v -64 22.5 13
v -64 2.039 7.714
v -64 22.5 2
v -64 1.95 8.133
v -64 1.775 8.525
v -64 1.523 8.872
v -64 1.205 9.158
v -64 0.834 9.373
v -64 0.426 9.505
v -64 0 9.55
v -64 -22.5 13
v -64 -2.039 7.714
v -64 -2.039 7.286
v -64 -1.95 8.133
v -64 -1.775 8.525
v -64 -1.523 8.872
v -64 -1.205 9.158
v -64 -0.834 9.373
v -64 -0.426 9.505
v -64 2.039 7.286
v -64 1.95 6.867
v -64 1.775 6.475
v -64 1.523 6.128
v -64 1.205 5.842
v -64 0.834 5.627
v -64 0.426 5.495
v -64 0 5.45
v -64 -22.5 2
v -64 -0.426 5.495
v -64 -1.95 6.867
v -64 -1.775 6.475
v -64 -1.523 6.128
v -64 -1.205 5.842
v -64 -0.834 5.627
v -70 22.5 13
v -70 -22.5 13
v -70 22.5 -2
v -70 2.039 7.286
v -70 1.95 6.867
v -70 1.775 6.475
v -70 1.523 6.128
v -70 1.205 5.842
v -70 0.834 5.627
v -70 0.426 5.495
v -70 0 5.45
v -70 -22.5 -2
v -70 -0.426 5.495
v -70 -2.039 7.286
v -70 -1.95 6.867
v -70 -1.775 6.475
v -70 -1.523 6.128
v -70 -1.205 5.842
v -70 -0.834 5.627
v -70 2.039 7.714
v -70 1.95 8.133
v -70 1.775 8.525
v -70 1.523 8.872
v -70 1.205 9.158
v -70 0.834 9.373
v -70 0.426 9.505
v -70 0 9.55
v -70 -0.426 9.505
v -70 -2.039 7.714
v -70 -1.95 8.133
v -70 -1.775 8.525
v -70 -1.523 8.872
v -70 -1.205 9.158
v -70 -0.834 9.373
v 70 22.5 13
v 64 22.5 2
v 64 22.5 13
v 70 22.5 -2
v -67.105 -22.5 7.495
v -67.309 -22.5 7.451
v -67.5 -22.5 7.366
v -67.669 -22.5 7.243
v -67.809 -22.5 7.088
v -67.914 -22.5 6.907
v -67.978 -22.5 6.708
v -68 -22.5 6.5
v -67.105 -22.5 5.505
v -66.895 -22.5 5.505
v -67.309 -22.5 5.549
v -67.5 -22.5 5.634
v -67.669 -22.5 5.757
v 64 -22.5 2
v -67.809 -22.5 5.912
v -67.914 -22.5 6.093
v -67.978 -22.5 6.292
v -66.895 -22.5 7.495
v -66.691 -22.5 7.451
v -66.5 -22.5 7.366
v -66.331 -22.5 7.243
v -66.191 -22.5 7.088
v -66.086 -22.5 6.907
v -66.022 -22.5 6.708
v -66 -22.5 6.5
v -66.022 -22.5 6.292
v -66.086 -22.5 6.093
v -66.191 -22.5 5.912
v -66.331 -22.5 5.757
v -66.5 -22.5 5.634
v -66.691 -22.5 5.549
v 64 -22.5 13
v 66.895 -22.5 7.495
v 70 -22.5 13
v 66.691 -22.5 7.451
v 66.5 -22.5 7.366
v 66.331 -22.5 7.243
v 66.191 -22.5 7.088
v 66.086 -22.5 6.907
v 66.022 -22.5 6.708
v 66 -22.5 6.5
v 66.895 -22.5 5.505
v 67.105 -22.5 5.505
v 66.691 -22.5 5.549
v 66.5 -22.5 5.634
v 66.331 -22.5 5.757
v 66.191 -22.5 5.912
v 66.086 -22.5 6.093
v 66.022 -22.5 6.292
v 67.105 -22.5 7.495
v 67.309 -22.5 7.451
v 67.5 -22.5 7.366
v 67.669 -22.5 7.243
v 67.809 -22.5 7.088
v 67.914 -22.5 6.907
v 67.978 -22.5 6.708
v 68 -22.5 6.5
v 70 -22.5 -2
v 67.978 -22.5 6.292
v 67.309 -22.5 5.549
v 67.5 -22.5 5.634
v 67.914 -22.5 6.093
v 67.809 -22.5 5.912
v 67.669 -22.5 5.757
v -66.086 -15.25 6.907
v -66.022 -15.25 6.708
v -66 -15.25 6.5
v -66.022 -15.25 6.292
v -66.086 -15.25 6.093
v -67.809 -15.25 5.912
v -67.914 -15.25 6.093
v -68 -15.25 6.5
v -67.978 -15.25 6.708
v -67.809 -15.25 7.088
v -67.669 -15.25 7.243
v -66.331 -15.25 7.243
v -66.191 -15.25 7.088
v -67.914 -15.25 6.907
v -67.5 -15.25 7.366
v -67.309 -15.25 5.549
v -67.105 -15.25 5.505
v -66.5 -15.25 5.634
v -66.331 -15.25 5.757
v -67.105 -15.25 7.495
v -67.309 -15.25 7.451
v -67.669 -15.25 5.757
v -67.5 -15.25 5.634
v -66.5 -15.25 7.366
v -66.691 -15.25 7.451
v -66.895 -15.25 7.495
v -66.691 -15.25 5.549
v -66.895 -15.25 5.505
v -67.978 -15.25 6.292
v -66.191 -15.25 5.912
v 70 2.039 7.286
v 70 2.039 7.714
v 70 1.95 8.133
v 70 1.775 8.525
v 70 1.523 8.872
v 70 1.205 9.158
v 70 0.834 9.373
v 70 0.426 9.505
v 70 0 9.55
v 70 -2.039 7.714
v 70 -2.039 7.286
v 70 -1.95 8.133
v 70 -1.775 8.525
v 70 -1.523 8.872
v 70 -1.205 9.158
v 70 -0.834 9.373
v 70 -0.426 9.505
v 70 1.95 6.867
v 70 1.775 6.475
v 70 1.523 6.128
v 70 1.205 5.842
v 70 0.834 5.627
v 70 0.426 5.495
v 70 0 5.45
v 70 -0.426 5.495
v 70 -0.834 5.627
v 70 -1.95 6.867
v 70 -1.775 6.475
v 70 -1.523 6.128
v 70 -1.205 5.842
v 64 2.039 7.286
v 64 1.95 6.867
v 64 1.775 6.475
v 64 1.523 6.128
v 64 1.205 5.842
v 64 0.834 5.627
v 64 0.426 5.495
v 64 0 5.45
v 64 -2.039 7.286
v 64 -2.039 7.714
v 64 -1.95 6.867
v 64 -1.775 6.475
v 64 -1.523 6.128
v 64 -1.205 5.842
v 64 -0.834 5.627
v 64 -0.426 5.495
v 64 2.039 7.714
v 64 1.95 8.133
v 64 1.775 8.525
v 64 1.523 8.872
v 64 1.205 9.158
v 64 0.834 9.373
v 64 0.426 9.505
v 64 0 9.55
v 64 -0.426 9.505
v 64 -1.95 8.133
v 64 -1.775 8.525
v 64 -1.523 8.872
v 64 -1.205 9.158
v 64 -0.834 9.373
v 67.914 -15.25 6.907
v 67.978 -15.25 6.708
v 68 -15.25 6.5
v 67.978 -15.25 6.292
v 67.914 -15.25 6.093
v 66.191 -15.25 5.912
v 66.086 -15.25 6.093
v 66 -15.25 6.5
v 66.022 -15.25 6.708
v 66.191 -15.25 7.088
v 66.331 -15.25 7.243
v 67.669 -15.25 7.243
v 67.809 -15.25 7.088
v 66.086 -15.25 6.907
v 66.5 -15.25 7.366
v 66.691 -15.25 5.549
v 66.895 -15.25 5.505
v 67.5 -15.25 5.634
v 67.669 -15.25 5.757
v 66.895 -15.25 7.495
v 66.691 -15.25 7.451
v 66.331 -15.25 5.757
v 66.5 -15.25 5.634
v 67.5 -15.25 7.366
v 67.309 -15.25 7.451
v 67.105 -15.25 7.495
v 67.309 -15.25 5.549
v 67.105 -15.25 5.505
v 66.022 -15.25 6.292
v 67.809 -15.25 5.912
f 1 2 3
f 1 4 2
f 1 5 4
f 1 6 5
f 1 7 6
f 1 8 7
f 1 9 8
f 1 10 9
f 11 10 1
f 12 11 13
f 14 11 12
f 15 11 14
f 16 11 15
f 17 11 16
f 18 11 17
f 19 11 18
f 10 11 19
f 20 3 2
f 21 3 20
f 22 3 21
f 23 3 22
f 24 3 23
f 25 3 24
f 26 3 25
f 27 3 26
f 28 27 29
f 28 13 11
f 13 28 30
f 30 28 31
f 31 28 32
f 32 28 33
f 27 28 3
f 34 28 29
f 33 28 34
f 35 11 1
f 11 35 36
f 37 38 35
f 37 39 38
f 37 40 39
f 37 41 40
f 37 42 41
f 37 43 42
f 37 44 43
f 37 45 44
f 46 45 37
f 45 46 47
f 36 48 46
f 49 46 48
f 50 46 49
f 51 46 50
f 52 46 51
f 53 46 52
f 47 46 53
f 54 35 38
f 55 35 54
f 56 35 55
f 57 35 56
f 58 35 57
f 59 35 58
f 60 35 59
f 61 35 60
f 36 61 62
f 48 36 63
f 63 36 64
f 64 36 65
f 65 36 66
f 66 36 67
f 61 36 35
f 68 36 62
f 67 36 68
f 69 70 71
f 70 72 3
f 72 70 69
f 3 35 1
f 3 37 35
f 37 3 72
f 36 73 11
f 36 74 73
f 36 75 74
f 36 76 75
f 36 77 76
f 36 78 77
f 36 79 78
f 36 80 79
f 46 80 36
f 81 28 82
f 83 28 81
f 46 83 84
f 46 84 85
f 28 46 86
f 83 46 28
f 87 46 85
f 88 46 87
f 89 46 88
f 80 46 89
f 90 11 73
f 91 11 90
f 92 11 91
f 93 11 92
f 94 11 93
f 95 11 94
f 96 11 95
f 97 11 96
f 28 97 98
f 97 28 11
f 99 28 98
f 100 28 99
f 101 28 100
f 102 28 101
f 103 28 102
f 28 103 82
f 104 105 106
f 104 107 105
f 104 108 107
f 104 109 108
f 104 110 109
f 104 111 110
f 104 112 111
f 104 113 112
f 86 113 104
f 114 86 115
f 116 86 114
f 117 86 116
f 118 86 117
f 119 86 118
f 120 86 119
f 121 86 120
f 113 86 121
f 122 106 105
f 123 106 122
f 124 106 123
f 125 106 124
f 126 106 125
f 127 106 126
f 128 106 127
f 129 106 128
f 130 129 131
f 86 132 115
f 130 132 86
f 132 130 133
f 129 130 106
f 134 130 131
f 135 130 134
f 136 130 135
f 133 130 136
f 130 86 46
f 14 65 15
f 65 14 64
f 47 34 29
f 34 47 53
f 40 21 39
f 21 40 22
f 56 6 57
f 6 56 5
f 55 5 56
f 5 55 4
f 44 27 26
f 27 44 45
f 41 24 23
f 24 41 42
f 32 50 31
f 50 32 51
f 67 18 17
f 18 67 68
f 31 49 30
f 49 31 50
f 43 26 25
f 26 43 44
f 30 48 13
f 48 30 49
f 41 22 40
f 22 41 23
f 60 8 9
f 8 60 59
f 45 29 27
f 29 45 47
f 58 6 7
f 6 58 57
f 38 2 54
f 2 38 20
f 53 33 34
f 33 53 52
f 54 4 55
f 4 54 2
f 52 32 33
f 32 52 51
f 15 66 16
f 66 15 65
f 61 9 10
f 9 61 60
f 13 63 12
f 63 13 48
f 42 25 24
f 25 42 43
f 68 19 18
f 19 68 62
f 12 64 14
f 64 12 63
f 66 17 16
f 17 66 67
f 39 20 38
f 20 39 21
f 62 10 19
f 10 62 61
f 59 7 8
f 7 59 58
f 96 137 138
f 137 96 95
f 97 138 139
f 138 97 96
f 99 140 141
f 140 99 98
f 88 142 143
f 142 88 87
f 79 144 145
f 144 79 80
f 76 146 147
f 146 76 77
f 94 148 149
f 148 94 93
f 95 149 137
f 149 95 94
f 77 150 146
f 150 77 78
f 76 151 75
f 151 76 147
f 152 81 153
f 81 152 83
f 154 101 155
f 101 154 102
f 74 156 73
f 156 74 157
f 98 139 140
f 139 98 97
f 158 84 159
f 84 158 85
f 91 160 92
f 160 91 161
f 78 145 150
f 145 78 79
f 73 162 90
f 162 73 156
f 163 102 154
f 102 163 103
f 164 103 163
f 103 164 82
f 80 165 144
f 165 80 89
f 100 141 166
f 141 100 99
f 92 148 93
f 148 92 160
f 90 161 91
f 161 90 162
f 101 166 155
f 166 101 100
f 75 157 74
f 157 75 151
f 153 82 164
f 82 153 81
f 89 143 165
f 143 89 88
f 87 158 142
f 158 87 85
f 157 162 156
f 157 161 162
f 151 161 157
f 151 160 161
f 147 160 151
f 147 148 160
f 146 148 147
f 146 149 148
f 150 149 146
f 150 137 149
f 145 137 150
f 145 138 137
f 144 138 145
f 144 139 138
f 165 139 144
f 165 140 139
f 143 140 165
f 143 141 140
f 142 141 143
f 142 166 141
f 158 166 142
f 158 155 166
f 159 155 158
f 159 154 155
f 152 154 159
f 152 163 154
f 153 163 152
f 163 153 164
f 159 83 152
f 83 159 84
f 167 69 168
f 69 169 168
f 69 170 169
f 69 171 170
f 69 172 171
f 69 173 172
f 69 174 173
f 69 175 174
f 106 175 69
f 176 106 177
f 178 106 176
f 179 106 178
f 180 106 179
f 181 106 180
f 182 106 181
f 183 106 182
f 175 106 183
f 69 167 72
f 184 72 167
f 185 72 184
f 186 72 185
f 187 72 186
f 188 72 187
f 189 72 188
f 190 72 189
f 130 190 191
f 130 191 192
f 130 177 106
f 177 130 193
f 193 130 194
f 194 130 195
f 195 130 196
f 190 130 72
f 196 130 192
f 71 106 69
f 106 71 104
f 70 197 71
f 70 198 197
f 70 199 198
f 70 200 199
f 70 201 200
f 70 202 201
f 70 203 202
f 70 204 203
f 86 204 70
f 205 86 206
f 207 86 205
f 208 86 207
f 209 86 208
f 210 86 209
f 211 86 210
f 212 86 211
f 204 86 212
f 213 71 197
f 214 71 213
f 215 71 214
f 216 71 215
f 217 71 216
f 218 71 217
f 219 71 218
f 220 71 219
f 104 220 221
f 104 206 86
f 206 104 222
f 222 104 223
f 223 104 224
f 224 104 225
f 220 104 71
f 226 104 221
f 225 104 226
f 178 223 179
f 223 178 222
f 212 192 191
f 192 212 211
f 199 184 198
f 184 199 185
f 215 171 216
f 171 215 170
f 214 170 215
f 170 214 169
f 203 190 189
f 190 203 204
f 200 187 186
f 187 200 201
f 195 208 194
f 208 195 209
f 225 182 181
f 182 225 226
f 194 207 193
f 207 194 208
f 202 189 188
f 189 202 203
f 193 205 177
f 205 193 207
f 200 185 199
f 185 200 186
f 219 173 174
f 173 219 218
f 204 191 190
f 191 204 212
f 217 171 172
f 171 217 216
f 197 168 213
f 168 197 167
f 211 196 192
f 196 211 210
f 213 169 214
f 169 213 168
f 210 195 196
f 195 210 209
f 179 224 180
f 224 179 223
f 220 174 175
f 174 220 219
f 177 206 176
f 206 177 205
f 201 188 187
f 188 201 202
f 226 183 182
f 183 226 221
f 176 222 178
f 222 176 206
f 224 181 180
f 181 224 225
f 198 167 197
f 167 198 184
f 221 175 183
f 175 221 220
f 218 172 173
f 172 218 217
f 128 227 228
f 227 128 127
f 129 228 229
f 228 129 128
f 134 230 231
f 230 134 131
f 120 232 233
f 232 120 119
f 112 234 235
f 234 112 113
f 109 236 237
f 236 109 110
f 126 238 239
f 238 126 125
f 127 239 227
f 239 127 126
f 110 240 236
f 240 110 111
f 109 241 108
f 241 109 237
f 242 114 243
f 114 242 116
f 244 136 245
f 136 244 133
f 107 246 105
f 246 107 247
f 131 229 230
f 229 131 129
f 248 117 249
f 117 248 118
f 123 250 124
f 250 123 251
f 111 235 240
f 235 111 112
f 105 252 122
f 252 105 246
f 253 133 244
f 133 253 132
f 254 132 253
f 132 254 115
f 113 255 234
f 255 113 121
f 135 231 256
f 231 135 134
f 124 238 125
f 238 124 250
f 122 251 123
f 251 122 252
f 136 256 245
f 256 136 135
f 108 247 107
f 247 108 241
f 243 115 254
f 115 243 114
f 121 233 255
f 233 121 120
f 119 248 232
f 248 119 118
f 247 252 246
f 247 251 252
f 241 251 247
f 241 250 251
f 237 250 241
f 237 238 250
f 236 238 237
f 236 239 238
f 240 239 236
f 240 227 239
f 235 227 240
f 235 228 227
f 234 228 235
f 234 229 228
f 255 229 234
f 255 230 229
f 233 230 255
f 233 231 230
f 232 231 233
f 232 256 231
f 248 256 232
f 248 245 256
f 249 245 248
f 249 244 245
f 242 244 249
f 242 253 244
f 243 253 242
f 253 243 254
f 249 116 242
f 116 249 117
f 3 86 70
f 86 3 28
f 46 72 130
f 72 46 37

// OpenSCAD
f_width= 140;
f_height=45;

cube([f_width, f_height, 4], center=true);

module side() {
    difference() {
        cube([6, f_height, 13], center=true);
        translate([0,0,1])
        rotate([0,90,0])
        cylinder(50, d=4.1, center=true, $fn=30);
        translate([0,-f_height/2-4,0])
        rotate([90,0,0])
        cylinder(f_height/2, d=2, center=true, $fn=30);
    }
}

translate([-(f_width-6)/2,0,13/2])
    side();
translate([+(f_width-6)/2,0,13/2])
    side();
